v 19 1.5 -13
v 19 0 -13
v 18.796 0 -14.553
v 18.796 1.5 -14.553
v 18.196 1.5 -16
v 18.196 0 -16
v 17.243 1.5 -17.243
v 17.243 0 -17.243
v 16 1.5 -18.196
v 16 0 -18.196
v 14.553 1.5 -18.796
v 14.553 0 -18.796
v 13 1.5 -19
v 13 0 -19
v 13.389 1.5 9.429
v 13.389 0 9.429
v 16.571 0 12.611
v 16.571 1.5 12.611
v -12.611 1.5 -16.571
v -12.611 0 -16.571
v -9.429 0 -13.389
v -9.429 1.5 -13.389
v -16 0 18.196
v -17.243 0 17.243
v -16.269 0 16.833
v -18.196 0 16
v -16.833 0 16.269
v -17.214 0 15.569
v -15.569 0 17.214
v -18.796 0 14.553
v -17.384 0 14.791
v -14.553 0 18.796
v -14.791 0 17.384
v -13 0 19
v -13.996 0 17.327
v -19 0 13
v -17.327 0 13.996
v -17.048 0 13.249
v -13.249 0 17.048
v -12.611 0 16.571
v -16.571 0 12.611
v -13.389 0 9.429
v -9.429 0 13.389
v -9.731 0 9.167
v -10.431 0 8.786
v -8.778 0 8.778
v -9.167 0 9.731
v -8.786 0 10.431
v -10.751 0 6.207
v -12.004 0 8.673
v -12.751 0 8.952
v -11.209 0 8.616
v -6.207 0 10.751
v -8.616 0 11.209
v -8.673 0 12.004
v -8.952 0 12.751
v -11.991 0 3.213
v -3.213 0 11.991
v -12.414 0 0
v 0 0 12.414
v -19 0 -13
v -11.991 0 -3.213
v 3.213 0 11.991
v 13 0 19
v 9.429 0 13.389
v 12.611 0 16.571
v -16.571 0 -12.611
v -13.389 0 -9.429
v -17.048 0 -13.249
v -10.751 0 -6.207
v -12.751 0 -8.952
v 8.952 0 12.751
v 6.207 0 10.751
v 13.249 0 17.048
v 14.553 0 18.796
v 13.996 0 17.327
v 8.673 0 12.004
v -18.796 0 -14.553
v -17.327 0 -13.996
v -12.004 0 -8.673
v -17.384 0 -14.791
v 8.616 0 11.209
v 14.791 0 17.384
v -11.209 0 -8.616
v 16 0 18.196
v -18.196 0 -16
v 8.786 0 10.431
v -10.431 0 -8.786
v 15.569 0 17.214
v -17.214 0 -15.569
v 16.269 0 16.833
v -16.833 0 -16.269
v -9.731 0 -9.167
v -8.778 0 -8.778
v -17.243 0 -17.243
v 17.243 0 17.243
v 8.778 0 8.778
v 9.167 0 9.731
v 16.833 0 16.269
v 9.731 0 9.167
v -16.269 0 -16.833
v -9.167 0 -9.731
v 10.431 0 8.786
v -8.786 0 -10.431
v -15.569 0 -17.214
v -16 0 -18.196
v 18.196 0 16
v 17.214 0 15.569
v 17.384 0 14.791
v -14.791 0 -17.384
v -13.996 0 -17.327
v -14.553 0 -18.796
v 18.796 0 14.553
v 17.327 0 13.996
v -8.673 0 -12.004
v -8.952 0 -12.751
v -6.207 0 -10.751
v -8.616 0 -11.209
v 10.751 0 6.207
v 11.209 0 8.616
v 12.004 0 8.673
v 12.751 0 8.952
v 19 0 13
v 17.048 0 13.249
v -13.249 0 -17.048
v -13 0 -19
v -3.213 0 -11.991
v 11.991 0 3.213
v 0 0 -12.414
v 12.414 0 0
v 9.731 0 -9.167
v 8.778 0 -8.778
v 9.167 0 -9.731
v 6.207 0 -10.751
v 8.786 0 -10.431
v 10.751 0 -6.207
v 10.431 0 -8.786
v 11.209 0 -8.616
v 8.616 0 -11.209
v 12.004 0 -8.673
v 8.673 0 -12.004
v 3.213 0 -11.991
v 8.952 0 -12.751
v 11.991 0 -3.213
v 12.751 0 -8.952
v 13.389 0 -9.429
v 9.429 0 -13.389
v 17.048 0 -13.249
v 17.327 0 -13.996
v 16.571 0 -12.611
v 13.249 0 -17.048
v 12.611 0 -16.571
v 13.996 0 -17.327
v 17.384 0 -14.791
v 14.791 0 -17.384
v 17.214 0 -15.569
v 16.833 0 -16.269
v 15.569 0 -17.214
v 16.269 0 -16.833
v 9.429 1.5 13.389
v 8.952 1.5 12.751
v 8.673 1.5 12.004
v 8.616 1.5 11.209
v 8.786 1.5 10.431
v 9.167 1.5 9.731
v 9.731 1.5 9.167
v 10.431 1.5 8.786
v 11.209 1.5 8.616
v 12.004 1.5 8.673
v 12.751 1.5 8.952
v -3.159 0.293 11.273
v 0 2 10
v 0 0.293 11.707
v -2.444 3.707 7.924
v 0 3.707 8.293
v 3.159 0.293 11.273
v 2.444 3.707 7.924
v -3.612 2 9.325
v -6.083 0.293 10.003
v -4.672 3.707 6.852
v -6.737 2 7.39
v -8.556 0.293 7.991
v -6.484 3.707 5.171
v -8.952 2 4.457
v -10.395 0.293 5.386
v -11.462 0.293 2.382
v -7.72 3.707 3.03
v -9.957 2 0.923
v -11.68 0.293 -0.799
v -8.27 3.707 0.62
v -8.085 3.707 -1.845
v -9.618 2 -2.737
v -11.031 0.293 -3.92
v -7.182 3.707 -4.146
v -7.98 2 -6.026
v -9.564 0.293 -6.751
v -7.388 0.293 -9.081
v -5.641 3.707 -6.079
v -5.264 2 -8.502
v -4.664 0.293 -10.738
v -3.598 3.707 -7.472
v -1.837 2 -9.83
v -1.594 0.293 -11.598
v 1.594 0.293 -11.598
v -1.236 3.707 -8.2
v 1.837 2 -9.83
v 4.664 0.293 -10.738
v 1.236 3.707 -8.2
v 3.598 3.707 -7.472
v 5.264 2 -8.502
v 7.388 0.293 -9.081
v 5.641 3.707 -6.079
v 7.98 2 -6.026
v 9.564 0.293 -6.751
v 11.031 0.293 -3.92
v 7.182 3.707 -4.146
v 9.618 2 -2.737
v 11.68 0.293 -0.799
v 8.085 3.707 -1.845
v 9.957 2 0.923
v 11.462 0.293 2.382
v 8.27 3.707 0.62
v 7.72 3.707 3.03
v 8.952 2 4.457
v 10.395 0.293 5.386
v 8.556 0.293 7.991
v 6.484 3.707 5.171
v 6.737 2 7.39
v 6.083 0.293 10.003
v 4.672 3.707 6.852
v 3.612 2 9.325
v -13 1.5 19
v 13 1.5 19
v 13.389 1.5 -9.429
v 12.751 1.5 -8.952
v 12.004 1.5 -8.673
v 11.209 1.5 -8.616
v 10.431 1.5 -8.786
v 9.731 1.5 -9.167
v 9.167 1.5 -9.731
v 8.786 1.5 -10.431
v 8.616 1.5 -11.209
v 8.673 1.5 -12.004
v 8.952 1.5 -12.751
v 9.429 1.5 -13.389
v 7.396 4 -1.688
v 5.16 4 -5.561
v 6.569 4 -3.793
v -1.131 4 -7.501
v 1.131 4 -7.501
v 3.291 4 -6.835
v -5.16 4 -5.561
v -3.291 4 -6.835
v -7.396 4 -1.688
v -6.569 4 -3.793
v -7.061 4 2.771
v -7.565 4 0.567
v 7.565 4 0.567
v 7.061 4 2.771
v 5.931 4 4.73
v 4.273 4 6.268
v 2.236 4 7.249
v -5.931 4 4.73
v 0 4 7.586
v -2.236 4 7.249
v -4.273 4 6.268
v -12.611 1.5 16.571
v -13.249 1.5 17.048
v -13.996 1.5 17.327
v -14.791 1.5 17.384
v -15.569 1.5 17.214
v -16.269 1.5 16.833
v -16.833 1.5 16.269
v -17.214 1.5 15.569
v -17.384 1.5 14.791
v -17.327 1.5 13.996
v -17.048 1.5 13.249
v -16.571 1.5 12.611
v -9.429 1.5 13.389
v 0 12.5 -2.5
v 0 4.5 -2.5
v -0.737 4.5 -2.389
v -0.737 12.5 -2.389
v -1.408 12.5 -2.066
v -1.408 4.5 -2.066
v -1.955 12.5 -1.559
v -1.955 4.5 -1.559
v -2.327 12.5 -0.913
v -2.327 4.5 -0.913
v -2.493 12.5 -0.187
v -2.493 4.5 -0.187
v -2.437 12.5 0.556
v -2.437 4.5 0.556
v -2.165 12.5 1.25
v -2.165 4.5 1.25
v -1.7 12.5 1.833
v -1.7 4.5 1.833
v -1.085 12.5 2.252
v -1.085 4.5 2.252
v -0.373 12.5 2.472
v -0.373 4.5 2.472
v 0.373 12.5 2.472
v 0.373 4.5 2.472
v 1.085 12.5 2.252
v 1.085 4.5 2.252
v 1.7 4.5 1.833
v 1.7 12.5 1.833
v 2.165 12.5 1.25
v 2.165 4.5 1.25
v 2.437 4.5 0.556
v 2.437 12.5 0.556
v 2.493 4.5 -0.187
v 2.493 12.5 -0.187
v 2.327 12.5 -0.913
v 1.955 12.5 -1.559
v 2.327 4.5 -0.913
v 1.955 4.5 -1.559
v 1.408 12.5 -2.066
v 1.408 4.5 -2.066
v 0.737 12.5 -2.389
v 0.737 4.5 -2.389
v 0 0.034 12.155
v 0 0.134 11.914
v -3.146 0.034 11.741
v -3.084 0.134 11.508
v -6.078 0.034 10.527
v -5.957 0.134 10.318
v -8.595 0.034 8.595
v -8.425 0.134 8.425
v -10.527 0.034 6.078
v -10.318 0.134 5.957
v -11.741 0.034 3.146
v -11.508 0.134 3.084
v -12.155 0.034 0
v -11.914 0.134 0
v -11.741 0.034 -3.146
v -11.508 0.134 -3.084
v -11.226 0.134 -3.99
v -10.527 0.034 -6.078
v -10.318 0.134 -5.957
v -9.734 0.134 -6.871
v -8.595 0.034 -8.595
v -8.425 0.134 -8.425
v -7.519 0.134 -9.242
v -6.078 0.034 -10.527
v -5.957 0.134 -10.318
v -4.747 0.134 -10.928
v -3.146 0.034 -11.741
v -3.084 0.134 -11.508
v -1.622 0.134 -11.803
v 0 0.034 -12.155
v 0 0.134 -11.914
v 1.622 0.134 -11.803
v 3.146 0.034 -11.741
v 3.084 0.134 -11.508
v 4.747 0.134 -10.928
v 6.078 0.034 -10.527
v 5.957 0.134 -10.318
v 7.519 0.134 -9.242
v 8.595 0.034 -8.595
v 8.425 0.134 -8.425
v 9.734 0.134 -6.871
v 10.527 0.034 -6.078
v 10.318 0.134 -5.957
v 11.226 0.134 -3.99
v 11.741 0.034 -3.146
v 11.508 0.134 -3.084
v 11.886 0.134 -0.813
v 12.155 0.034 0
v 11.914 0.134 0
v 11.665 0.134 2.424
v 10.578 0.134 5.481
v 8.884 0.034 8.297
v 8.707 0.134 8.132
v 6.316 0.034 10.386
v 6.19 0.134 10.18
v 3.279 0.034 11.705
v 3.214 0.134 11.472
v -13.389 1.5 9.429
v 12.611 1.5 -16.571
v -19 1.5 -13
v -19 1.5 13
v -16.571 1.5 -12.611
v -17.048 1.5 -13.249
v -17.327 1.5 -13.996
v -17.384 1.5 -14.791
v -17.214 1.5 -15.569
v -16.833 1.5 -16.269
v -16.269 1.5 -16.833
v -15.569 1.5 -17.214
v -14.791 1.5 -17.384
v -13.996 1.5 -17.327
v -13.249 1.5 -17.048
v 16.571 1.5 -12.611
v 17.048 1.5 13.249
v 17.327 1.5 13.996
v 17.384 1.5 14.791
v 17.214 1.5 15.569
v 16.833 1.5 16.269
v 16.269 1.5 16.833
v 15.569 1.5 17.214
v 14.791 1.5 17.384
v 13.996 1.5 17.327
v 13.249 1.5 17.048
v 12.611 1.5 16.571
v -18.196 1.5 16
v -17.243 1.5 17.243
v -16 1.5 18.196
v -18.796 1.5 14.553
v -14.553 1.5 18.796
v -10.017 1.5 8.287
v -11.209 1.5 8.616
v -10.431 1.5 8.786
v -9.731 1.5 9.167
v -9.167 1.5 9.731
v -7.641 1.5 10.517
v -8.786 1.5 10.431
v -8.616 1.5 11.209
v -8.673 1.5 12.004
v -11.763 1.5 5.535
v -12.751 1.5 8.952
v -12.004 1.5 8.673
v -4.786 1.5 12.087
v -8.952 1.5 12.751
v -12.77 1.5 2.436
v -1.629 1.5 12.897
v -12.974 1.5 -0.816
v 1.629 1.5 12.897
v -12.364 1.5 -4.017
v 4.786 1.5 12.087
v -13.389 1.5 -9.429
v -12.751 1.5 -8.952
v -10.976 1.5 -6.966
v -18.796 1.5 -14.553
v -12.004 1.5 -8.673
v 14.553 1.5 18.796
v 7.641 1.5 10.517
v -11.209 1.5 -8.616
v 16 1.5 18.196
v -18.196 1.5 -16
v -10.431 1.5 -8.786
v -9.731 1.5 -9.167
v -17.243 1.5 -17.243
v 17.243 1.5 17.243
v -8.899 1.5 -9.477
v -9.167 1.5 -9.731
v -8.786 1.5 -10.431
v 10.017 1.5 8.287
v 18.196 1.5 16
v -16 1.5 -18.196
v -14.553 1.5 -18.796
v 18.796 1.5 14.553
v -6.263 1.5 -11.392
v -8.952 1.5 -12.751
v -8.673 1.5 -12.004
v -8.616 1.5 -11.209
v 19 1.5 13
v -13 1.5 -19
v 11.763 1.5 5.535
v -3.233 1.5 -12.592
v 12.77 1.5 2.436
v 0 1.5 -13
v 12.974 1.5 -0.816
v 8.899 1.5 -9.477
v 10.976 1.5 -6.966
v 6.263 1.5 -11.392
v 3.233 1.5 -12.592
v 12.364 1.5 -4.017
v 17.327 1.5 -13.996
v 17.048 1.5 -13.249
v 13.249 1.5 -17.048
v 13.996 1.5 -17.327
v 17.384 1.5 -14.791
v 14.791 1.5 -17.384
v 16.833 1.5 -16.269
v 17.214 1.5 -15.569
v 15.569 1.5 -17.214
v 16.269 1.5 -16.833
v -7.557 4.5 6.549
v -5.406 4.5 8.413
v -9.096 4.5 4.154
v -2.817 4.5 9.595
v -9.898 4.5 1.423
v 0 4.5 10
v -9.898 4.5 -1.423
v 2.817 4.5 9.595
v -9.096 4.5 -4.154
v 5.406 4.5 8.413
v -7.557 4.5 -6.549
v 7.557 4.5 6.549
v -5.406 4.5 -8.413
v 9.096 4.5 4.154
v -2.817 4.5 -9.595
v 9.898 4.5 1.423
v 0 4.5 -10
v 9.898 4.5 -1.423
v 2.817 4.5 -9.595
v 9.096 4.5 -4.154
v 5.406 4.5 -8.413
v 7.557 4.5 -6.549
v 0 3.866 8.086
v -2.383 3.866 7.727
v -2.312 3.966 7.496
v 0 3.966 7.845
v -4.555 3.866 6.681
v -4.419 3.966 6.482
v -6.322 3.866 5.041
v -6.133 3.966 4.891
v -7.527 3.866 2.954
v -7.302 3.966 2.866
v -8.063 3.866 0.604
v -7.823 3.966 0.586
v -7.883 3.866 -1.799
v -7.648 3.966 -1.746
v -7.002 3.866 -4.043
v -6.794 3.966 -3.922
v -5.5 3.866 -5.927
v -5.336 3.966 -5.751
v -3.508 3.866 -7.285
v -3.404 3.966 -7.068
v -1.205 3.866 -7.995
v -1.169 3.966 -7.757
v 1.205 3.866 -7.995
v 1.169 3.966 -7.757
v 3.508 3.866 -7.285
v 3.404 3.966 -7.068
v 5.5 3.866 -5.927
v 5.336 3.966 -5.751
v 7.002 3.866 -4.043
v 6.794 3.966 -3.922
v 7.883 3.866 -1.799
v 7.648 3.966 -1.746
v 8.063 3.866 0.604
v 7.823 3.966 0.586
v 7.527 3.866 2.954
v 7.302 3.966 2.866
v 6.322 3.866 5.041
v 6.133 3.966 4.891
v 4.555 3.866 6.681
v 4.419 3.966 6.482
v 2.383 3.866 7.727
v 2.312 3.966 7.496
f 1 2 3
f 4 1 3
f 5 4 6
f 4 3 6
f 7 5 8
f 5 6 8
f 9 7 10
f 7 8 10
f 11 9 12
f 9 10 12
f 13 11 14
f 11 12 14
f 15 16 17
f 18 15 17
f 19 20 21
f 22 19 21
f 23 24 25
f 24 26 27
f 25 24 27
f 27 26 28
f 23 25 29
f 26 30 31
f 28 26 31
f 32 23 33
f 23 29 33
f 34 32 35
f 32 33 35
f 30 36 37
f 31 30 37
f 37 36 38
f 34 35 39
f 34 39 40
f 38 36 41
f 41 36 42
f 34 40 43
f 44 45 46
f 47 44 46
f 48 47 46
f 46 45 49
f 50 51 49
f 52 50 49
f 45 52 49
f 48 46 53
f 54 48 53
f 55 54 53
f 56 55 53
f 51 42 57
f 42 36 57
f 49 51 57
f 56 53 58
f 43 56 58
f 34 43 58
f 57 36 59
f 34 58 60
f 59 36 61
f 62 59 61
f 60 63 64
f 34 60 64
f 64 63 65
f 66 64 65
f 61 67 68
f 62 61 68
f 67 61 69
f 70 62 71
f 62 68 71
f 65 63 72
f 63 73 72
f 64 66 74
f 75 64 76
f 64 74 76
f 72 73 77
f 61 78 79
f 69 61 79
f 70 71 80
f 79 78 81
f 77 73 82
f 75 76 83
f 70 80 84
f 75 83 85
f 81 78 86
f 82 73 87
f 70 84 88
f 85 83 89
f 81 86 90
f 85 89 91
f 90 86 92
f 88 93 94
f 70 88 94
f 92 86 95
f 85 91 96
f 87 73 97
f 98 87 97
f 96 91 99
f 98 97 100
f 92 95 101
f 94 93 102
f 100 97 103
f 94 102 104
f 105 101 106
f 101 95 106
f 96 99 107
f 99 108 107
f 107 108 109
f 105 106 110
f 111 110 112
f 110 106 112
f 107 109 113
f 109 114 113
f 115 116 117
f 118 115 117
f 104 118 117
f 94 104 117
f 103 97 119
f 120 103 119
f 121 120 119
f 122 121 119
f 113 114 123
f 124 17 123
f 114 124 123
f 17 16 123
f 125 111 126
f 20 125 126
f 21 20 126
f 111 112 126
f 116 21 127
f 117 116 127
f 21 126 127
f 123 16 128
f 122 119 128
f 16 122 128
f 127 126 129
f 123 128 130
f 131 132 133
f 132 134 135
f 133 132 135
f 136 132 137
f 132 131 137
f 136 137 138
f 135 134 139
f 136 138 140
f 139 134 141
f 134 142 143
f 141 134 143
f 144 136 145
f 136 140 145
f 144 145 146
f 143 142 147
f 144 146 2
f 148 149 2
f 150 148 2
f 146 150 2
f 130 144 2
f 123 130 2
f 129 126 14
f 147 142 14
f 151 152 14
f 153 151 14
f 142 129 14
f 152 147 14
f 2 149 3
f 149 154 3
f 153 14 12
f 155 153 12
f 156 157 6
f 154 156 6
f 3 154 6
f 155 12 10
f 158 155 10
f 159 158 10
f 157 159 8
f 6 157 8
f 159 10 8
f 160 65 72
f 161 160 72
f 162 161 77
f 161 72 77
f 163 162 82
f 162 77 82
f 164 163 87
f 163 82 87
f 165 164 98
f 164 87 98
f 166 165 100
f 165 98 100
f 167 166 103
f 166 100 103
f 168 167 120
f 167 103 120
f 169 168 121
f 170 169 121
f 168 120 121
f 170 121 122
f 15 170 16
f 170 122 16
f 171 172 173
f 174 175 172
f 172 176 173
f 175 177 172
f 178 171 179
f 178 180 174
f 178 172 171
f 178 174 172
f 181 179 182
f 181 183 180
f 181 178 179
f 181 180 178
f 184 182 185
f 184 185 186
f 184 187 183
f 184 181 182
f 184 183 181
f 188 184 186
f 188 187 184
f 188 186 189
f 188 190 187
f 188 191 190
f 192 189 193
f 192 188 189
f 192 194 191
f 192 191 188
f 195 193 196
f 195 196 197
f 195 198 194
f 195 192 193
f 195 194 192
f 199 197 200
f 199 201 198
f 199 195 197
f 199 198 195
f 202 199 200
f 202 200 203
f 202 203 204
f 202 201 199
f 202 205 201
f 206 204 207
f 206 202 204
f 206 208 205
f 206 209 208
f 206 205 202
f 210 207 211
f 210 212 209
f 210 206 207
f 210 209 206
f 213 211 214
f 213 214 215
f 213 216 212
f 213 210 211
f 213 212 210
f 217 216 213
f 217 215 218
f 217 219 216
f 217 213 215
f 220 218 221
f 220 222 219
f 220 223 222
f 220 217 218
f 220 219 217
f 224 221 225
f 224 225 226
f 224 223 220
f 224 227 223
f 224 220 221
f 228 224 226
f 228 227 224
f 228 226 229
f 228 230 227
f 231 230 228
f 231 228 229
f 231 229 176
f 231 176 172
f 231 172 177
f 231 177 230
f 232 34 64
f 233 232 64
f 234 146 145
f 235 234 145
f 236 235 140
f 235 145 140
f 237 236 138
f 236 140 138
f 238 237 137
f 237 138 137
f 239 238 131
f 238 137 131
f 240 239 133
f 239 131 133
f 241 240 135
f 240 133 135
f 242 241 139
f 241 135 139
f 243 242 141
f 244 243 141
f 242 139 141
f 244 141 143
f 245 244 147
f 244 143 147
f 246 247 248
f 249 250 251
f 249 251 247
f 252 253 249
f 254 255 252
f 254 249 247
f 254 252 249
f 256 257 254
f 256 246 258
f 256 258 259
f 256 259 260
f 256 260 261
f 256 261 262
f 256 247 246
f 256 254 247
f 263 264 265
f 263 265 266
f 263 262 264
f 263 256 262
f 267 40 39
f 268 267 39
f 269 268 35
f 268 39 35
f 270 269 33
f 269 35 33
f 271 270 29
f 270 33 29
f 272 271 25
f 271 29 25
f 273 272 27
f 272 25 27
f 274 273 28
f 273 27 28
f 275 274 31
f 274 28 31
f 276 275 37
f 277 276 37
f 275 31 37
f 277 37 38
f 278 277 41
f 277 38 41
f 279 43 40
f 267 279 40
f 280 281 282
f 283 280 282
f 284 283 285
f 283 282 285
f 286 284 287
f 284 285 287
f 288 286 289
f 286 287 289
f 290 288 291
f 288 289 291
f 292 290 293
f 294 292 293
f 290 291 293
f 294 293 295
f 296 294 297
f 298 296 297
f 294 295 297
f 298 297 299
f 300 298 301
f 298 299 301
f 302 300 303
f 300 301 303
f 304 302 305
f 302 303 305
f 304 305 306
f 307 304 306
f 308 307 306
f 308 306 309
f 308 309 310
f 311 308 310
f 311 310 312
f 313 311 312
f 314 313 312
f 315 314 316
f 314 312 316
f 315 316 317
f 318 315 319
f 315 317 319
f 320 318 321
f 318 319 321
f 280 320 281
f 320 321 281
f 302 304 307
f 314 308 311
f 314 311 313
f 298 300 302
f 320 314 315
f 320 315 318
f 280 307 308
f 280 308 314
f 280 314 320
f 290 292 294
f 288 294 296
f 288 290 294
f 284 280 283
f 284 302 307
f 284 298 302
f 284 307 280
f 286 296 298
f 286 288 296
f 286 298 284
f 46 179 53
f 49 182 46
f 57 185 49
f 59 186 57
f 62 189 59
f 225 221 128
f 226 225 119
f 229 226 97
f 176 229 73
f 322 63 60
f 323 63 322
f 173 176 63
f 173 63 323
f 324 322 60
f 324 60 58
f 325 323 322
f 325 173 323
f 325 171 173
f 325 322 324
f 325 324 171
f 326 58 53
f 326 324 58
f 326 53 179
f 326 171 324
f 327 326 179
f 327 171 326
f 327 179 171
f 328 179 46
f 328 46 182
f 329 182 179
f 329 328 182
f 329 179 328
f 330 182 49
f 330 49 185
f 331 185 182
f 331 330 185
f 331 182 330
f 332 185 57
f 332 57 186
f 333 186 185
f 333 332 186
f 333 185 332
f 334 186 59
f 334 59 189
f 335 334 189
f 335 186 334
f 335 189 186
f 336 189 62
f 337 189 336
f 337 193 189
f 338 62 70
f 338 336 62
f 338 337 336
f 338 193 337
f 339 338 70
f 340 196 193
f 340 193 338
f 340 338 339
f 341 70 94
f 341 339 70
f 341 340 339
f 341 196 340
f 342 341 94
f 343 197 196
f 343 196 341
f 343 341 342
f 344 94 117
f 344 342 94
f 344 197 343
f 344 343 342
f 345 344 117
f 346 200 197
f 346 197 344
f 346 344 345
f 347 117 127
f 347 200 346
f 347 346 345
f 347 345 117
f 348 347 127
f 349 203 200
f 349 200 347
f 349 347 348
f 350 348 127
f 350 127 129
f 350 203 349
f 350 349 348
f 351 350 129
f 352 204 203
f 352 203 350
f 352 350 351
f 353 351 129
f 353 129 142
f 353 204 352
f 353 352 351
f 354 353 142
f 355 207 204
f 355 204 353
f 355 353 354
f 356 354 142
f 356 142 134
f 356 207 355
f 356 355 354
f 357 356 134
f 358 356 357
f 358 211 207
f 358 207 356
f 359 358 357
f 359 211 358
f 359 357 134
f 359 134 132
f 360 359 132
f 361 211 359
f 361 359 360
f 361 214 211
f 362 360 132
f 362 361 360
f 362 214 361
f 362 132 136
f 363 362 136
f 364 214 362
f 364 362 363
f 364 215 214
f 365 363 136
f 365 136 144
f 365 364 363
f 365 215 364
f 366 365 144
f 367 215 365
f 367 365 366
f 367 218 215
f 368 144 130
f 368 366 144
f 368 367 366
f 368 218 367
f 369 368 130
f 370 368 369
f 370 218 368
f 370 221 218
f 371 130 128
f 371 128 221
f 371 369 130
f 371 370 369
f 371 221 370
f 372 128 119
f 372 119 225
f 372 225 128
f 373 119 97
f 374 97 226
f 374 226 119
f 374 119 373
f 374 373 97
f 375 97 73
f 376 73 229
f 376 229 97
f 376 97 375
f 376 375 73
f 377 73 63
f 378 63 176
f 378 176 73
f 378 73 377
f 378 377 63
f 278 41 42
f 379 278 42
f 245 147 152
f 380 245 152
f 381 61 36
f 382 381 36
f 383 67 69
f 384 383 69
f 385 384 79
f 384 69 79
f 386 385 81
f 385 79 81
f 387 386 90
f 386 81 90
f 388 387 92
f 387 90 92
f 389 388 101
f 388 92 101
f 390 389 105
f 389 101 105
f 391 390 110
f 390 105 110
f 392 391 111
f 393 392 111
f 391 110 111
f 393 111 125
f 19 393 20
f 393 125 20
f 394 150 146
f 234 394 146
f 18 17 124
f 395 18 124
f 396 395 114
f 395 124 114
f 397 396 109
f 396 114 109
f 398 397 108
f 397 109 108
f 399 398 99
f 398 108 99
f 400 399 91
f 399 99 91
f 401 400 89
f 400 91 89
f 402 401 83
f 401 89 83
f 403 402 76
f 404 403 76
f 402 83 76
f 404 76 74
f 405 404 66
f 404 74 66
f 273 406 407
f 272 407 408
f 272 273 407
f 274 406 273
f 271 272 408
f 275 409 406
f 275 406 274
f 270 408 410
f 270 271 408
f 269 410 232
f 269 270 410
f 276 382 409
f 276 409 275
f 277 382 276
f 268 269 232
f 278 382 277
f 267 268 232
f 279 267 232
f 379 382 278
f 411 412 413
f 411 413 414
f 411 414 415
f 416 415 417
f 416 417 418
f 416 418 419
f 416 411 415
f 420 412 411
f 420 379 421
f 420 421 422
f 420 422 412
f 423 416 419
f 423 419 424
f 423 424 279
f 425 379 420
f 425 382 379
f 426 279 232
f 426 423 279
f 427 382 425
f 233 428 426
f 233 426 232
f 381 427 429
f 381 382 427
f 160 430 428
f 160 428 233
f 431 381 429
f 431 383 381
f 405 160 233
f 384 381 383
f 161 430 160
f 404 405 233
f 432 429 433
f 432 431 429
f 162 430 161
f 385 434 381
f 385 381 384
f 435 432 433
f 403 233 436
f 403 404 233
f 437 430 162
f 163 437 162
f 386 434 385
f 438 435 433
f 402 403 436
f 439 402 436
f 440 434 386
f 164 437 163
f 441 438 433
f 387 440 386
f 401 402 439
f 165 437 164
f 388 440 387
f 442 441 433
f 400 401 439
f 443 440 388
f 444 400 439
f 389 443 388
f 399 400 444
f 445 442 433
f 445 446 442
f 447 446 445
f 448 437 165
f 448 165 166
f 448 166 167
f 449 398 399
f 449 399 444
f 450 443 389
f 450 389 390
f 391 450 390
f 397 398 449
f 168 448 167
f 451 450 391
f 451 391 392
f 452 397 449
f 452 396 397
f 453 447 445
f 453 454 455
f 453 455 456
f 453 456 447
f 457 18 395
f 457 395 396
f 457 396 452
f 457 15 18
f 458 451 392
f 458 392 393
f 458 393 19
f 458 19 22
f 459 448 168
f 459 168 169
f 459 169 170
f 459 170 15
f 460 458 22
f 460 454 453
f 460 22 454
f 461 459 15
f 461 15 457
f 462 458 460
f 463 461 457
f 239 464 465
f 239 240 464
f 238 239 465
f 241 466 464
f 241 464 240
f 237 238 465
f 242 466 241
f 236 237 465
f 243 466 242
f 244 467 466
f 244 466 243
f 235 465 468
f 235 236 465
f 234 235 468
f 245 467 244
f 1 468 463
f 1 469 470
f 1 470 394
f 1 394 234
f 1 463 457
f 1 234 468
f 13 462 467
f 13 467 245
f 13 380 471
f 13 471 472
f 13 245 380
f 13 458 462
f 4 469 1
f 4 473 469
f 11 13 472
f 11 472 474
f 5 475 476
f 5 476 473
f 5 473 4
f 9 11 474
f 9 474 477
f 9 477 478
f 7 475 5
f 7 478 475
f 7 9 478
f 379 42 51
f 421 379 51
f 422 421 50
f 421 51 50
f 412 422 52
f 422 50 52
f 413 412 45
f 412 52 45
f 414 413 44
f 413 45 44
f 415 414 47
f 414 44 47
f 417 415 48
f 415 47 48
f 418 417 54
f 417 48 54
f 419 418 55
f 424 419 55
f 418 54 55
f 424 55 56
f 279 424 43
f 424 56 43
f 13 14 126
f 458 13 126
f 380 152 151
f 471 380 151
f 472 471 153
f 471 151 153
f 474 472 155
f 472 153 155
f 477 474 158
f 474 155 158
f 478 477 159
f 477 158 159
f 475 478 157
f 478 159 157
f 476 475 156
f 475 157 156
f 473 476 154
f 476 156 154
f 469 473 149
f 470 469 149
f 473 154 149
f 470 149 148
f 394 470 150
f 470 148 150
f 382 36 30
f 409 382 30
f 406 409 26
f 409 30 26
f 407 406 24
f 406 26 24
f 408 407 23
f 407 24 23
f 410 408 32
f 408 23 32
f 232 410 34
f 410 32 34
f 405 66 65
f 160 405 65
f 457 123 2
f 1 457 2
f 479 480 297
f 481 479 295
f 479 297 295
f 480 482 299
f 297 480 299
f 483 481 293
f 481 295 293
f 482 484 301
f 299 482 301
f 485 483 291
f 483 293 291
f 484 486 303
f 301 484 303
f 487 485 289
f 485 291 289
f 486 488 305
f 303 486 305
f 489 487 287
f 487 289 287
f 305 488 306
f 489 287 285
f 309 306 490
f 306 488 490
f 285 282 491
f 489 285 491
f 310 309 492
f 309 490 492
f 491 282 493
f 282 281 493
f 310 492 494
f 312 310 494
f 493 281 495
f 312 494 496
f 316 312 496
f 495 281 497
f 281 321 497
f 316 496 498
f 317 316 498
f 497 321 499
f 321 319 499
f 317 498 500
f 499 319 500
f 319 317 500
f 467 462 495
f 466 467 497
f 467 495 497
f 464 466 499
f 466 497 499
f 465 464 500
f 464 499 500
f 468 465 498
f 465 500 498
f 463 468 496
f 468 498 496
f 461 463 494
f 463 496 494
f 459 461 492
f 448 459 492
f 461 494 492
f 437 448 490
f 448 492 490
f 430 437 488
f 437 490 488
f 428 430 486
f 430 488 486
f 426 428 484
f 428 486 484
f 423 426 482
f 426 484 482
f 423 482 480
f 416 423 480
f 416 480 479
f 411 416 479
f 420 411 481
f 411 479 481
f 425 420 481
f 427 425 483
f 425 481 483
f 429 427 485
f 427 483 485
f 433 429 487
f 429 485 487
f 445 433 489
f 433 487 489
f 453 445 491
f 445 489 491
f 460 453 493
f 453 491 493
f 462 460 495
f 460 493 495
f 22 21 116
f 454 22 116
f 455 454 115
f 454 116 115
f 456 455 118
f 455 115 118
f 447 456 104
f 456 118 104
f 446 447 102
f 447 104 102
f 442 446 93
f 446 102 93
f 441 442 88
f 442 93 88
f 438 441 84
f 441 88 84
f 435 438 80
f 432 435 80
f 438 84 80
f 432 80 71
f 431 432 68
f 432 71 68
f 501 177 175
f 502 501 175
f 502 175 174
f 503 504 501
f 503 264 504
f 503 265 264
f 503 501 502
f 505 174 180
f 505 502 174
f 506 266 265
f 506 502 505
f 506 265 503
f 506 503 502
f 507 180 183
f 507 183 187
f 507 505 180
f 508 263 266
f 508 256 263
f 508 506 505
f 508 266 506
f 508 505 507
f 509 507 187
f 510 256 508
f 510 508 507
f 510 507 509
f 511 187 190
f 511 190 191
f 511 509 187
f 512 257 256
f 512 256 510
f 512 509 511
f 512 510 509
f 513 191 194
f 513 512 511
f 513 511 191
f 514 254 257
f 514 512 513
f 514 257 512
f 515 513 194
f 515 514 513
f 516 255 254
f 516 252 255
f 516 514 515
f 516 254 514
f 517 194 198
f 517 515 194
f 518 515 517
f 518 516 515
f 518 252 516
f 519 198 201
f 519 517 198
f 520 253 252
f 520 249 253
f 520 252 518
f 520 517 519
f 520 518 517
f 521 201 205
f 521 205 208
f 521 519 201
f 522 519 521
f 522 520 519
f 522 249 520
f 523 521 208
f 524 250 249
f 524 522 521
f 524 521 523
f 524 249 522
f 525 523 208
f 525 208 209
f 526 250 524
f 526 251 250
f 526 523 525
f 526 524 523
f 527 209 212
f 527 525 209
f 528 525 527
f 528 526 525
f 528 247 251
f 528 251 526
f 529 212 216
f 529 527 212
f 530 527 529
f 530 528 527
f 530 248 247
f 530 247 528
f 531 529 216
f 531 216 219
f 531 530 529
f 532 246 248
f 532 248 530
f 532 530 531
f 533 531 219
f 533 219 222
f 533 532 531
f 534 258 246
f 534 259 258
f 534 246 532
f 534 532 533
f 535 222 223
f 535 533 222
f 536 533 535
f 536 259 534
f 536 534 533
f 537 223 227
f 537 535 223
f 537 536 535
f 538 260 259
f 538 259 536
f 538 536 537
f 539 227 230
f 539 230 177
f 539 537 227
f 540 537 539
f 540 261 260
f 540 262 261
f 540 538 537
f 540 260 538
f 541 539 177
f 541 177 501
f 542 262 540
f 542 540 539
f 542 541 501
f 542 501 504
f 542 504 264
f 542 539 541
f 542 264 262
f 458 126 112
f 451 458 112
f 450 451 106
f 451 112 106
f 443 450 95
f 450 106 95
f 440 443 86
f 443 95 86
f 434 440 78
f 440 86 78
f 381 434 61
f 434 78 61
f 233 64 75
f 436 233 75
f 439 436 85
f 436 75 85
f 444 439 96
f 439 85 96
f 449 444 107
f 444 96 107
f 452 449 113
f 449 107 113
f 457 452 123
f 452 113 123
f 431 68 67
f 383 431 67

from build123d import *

# Parameters (mm, degrees)
BOSS_EXTRUDE1_DEPTH = 1.5
FILLET1_R           = 1
SKETCH5_R           = 2.5
BOSS_EXTRUDE2_DEPTH = 8


with BuildPart() as part:
    # Sketch1 → Boss-Extrude1 (new body)
    with BuildSketch(Plane(origin=(0, 0, 0), x_dir=(1, 0, 0), z_dir=(0, 1, 0))):
        with BuildLine():
            Line((-13, -19), (13, -19))
            ThreePointArc((13, -19), (17.242640687, -17.242640687), (19, -13))
            Line((19, -13), (19, 13))
            ThreePointArc((19, 13), (17.242640687, 17.242640687), (13, 19))
            Line((13, 19), (-13, 19))
            ThreePointArc((-13, 19), (-17.242640687, 17.242640687), (-19, 13))
            Line((-19, 13), (-19, -13))
            ThreePointArc((-19, -13), (-17.242640687, -17.242640687), (-13, -19))
        make_face()
        with BuildLine():
            Line((-12.61109127, 16.570889245), (-9.429110755, 13.38890873))
            ThreePointArc((-9.429110755, 13.38890873), (-9.429110755, 9.429110755), (-13.38890873, 9.429110755))
            Line((-13.38890873, 9.429110755), (-16.570889245, 12.61109127))
            ThreePointArc((-16.570889245, 12.61109127), (-16.570889245, 16.570889245), (-12.61109127, 16.570889245))
        make_face(mode=Mode.SUBTRACT)
        with BuildLine():
            Line((16.570889245, 12.61109127), (13.38890873, 9.429110755))
            ThreePointArc((13.38890873, 9.429110755), (9.429110755, 9.429110755), (9.429110755, 13.38890873))
            Line((9.429110755, 13.38890873), (12.61109127, 16.570889245))
            ThreePointArc((12.61109127, 16.570889245), (16.570889245, 16.570889245), (16.570889245, 12.61109127))
        make_face(mode=Mode.SUBTRACT)
        with BuildLine():
            Line((12.61109127, -16.570889245), (9.429110755, -13.38890873))
            ThreePointArc((9.429110755, -13.38890873), (9.429110755, -9.429110755), (13.38890873, -9.429110755))
            Line((13.38890873, -9.429110755), (16.570889245, -12.61109127))
            ThreePointArc((16.570889245, -12.61109127), (16.570889245, -16.570889245), (12.61109127, -16.570889245))
        make_face(mode=Mode.SUBTRACT)
        with BuildLine():
            Line((-16.570889245, -12.61109127), (-13.38890873, -9.429110755))
            ThreePointArc((-13.38890873, -9.429110755), (-9.429110755, -9.429110755), (-9.429110755, -13.38890873))
            Line((-9.429110755, -13.38890873), (-12.61109127, -16.570889245))
            ThreePointArc((-12.61109127, -16.570889245), (-16.570889245, -16.570889245), (-16.570889245, -12.61109127))
        make_face(mode=Mode.SUBTRACT)
    extrude(amount=BOSS_EXTRUDE1_DEPTH)

    # Sketch3 → Revolve1 (revolve)
    with BuildSketch(Plane(origin=(0, 0, 0), x_dir=(0, 0, -1), z_dir=(1, 0, 0))):
        Polygon((0, 1.5), (13, 1.5), (10, 4.5), (0, 4.5), align=None)
    revolve(axis=Axis((0, 4.5, 0), (0, -1, 0)))

    # Sketch4 → Cut-Revolve1 (revolve, cut)
    with BuildSketch(Plane(origin=(0, 0, 0), x_dir=(0, 0, -1), z_dir=(1, 0, 0)), mode=Mode.PRIVATE) as cut_revolve1_sk:
        Polygon((0, 0), (12, 0), (8, 4), (0, 4), align=None)
    revolve(cut_revolve1_sk.sketch.rotate(Axis((0, 4, 0), (0, -1, 0)), 180), axis=Axis((0, 4, 0), (0, -1, 0)), mode=Mode.SUBTRACT)

    # Fillet1
    fillet1_edges = [part.edges().sort_by_distance(p)[0] for p in [
        (0, 0, -12),
        (0, 4, -8),
    ]]
    fillet(fillet1_edges, radius=FILLET1_R)

    # Sketch5 → Boss-Extrude2 (add)
    with BuildSketch(Plane(origin=(0, 4.5, 0), x_dir=(1, 0, 0), z_dir=(0, 1, 0))):
        with Locations(Location((0, 0, 0), (0, 0, 90))):
            Circle(SKETCH5_R)
    extrude(amount=BOSS_EXTRUDE2_DEPTH)


solid = part.part
